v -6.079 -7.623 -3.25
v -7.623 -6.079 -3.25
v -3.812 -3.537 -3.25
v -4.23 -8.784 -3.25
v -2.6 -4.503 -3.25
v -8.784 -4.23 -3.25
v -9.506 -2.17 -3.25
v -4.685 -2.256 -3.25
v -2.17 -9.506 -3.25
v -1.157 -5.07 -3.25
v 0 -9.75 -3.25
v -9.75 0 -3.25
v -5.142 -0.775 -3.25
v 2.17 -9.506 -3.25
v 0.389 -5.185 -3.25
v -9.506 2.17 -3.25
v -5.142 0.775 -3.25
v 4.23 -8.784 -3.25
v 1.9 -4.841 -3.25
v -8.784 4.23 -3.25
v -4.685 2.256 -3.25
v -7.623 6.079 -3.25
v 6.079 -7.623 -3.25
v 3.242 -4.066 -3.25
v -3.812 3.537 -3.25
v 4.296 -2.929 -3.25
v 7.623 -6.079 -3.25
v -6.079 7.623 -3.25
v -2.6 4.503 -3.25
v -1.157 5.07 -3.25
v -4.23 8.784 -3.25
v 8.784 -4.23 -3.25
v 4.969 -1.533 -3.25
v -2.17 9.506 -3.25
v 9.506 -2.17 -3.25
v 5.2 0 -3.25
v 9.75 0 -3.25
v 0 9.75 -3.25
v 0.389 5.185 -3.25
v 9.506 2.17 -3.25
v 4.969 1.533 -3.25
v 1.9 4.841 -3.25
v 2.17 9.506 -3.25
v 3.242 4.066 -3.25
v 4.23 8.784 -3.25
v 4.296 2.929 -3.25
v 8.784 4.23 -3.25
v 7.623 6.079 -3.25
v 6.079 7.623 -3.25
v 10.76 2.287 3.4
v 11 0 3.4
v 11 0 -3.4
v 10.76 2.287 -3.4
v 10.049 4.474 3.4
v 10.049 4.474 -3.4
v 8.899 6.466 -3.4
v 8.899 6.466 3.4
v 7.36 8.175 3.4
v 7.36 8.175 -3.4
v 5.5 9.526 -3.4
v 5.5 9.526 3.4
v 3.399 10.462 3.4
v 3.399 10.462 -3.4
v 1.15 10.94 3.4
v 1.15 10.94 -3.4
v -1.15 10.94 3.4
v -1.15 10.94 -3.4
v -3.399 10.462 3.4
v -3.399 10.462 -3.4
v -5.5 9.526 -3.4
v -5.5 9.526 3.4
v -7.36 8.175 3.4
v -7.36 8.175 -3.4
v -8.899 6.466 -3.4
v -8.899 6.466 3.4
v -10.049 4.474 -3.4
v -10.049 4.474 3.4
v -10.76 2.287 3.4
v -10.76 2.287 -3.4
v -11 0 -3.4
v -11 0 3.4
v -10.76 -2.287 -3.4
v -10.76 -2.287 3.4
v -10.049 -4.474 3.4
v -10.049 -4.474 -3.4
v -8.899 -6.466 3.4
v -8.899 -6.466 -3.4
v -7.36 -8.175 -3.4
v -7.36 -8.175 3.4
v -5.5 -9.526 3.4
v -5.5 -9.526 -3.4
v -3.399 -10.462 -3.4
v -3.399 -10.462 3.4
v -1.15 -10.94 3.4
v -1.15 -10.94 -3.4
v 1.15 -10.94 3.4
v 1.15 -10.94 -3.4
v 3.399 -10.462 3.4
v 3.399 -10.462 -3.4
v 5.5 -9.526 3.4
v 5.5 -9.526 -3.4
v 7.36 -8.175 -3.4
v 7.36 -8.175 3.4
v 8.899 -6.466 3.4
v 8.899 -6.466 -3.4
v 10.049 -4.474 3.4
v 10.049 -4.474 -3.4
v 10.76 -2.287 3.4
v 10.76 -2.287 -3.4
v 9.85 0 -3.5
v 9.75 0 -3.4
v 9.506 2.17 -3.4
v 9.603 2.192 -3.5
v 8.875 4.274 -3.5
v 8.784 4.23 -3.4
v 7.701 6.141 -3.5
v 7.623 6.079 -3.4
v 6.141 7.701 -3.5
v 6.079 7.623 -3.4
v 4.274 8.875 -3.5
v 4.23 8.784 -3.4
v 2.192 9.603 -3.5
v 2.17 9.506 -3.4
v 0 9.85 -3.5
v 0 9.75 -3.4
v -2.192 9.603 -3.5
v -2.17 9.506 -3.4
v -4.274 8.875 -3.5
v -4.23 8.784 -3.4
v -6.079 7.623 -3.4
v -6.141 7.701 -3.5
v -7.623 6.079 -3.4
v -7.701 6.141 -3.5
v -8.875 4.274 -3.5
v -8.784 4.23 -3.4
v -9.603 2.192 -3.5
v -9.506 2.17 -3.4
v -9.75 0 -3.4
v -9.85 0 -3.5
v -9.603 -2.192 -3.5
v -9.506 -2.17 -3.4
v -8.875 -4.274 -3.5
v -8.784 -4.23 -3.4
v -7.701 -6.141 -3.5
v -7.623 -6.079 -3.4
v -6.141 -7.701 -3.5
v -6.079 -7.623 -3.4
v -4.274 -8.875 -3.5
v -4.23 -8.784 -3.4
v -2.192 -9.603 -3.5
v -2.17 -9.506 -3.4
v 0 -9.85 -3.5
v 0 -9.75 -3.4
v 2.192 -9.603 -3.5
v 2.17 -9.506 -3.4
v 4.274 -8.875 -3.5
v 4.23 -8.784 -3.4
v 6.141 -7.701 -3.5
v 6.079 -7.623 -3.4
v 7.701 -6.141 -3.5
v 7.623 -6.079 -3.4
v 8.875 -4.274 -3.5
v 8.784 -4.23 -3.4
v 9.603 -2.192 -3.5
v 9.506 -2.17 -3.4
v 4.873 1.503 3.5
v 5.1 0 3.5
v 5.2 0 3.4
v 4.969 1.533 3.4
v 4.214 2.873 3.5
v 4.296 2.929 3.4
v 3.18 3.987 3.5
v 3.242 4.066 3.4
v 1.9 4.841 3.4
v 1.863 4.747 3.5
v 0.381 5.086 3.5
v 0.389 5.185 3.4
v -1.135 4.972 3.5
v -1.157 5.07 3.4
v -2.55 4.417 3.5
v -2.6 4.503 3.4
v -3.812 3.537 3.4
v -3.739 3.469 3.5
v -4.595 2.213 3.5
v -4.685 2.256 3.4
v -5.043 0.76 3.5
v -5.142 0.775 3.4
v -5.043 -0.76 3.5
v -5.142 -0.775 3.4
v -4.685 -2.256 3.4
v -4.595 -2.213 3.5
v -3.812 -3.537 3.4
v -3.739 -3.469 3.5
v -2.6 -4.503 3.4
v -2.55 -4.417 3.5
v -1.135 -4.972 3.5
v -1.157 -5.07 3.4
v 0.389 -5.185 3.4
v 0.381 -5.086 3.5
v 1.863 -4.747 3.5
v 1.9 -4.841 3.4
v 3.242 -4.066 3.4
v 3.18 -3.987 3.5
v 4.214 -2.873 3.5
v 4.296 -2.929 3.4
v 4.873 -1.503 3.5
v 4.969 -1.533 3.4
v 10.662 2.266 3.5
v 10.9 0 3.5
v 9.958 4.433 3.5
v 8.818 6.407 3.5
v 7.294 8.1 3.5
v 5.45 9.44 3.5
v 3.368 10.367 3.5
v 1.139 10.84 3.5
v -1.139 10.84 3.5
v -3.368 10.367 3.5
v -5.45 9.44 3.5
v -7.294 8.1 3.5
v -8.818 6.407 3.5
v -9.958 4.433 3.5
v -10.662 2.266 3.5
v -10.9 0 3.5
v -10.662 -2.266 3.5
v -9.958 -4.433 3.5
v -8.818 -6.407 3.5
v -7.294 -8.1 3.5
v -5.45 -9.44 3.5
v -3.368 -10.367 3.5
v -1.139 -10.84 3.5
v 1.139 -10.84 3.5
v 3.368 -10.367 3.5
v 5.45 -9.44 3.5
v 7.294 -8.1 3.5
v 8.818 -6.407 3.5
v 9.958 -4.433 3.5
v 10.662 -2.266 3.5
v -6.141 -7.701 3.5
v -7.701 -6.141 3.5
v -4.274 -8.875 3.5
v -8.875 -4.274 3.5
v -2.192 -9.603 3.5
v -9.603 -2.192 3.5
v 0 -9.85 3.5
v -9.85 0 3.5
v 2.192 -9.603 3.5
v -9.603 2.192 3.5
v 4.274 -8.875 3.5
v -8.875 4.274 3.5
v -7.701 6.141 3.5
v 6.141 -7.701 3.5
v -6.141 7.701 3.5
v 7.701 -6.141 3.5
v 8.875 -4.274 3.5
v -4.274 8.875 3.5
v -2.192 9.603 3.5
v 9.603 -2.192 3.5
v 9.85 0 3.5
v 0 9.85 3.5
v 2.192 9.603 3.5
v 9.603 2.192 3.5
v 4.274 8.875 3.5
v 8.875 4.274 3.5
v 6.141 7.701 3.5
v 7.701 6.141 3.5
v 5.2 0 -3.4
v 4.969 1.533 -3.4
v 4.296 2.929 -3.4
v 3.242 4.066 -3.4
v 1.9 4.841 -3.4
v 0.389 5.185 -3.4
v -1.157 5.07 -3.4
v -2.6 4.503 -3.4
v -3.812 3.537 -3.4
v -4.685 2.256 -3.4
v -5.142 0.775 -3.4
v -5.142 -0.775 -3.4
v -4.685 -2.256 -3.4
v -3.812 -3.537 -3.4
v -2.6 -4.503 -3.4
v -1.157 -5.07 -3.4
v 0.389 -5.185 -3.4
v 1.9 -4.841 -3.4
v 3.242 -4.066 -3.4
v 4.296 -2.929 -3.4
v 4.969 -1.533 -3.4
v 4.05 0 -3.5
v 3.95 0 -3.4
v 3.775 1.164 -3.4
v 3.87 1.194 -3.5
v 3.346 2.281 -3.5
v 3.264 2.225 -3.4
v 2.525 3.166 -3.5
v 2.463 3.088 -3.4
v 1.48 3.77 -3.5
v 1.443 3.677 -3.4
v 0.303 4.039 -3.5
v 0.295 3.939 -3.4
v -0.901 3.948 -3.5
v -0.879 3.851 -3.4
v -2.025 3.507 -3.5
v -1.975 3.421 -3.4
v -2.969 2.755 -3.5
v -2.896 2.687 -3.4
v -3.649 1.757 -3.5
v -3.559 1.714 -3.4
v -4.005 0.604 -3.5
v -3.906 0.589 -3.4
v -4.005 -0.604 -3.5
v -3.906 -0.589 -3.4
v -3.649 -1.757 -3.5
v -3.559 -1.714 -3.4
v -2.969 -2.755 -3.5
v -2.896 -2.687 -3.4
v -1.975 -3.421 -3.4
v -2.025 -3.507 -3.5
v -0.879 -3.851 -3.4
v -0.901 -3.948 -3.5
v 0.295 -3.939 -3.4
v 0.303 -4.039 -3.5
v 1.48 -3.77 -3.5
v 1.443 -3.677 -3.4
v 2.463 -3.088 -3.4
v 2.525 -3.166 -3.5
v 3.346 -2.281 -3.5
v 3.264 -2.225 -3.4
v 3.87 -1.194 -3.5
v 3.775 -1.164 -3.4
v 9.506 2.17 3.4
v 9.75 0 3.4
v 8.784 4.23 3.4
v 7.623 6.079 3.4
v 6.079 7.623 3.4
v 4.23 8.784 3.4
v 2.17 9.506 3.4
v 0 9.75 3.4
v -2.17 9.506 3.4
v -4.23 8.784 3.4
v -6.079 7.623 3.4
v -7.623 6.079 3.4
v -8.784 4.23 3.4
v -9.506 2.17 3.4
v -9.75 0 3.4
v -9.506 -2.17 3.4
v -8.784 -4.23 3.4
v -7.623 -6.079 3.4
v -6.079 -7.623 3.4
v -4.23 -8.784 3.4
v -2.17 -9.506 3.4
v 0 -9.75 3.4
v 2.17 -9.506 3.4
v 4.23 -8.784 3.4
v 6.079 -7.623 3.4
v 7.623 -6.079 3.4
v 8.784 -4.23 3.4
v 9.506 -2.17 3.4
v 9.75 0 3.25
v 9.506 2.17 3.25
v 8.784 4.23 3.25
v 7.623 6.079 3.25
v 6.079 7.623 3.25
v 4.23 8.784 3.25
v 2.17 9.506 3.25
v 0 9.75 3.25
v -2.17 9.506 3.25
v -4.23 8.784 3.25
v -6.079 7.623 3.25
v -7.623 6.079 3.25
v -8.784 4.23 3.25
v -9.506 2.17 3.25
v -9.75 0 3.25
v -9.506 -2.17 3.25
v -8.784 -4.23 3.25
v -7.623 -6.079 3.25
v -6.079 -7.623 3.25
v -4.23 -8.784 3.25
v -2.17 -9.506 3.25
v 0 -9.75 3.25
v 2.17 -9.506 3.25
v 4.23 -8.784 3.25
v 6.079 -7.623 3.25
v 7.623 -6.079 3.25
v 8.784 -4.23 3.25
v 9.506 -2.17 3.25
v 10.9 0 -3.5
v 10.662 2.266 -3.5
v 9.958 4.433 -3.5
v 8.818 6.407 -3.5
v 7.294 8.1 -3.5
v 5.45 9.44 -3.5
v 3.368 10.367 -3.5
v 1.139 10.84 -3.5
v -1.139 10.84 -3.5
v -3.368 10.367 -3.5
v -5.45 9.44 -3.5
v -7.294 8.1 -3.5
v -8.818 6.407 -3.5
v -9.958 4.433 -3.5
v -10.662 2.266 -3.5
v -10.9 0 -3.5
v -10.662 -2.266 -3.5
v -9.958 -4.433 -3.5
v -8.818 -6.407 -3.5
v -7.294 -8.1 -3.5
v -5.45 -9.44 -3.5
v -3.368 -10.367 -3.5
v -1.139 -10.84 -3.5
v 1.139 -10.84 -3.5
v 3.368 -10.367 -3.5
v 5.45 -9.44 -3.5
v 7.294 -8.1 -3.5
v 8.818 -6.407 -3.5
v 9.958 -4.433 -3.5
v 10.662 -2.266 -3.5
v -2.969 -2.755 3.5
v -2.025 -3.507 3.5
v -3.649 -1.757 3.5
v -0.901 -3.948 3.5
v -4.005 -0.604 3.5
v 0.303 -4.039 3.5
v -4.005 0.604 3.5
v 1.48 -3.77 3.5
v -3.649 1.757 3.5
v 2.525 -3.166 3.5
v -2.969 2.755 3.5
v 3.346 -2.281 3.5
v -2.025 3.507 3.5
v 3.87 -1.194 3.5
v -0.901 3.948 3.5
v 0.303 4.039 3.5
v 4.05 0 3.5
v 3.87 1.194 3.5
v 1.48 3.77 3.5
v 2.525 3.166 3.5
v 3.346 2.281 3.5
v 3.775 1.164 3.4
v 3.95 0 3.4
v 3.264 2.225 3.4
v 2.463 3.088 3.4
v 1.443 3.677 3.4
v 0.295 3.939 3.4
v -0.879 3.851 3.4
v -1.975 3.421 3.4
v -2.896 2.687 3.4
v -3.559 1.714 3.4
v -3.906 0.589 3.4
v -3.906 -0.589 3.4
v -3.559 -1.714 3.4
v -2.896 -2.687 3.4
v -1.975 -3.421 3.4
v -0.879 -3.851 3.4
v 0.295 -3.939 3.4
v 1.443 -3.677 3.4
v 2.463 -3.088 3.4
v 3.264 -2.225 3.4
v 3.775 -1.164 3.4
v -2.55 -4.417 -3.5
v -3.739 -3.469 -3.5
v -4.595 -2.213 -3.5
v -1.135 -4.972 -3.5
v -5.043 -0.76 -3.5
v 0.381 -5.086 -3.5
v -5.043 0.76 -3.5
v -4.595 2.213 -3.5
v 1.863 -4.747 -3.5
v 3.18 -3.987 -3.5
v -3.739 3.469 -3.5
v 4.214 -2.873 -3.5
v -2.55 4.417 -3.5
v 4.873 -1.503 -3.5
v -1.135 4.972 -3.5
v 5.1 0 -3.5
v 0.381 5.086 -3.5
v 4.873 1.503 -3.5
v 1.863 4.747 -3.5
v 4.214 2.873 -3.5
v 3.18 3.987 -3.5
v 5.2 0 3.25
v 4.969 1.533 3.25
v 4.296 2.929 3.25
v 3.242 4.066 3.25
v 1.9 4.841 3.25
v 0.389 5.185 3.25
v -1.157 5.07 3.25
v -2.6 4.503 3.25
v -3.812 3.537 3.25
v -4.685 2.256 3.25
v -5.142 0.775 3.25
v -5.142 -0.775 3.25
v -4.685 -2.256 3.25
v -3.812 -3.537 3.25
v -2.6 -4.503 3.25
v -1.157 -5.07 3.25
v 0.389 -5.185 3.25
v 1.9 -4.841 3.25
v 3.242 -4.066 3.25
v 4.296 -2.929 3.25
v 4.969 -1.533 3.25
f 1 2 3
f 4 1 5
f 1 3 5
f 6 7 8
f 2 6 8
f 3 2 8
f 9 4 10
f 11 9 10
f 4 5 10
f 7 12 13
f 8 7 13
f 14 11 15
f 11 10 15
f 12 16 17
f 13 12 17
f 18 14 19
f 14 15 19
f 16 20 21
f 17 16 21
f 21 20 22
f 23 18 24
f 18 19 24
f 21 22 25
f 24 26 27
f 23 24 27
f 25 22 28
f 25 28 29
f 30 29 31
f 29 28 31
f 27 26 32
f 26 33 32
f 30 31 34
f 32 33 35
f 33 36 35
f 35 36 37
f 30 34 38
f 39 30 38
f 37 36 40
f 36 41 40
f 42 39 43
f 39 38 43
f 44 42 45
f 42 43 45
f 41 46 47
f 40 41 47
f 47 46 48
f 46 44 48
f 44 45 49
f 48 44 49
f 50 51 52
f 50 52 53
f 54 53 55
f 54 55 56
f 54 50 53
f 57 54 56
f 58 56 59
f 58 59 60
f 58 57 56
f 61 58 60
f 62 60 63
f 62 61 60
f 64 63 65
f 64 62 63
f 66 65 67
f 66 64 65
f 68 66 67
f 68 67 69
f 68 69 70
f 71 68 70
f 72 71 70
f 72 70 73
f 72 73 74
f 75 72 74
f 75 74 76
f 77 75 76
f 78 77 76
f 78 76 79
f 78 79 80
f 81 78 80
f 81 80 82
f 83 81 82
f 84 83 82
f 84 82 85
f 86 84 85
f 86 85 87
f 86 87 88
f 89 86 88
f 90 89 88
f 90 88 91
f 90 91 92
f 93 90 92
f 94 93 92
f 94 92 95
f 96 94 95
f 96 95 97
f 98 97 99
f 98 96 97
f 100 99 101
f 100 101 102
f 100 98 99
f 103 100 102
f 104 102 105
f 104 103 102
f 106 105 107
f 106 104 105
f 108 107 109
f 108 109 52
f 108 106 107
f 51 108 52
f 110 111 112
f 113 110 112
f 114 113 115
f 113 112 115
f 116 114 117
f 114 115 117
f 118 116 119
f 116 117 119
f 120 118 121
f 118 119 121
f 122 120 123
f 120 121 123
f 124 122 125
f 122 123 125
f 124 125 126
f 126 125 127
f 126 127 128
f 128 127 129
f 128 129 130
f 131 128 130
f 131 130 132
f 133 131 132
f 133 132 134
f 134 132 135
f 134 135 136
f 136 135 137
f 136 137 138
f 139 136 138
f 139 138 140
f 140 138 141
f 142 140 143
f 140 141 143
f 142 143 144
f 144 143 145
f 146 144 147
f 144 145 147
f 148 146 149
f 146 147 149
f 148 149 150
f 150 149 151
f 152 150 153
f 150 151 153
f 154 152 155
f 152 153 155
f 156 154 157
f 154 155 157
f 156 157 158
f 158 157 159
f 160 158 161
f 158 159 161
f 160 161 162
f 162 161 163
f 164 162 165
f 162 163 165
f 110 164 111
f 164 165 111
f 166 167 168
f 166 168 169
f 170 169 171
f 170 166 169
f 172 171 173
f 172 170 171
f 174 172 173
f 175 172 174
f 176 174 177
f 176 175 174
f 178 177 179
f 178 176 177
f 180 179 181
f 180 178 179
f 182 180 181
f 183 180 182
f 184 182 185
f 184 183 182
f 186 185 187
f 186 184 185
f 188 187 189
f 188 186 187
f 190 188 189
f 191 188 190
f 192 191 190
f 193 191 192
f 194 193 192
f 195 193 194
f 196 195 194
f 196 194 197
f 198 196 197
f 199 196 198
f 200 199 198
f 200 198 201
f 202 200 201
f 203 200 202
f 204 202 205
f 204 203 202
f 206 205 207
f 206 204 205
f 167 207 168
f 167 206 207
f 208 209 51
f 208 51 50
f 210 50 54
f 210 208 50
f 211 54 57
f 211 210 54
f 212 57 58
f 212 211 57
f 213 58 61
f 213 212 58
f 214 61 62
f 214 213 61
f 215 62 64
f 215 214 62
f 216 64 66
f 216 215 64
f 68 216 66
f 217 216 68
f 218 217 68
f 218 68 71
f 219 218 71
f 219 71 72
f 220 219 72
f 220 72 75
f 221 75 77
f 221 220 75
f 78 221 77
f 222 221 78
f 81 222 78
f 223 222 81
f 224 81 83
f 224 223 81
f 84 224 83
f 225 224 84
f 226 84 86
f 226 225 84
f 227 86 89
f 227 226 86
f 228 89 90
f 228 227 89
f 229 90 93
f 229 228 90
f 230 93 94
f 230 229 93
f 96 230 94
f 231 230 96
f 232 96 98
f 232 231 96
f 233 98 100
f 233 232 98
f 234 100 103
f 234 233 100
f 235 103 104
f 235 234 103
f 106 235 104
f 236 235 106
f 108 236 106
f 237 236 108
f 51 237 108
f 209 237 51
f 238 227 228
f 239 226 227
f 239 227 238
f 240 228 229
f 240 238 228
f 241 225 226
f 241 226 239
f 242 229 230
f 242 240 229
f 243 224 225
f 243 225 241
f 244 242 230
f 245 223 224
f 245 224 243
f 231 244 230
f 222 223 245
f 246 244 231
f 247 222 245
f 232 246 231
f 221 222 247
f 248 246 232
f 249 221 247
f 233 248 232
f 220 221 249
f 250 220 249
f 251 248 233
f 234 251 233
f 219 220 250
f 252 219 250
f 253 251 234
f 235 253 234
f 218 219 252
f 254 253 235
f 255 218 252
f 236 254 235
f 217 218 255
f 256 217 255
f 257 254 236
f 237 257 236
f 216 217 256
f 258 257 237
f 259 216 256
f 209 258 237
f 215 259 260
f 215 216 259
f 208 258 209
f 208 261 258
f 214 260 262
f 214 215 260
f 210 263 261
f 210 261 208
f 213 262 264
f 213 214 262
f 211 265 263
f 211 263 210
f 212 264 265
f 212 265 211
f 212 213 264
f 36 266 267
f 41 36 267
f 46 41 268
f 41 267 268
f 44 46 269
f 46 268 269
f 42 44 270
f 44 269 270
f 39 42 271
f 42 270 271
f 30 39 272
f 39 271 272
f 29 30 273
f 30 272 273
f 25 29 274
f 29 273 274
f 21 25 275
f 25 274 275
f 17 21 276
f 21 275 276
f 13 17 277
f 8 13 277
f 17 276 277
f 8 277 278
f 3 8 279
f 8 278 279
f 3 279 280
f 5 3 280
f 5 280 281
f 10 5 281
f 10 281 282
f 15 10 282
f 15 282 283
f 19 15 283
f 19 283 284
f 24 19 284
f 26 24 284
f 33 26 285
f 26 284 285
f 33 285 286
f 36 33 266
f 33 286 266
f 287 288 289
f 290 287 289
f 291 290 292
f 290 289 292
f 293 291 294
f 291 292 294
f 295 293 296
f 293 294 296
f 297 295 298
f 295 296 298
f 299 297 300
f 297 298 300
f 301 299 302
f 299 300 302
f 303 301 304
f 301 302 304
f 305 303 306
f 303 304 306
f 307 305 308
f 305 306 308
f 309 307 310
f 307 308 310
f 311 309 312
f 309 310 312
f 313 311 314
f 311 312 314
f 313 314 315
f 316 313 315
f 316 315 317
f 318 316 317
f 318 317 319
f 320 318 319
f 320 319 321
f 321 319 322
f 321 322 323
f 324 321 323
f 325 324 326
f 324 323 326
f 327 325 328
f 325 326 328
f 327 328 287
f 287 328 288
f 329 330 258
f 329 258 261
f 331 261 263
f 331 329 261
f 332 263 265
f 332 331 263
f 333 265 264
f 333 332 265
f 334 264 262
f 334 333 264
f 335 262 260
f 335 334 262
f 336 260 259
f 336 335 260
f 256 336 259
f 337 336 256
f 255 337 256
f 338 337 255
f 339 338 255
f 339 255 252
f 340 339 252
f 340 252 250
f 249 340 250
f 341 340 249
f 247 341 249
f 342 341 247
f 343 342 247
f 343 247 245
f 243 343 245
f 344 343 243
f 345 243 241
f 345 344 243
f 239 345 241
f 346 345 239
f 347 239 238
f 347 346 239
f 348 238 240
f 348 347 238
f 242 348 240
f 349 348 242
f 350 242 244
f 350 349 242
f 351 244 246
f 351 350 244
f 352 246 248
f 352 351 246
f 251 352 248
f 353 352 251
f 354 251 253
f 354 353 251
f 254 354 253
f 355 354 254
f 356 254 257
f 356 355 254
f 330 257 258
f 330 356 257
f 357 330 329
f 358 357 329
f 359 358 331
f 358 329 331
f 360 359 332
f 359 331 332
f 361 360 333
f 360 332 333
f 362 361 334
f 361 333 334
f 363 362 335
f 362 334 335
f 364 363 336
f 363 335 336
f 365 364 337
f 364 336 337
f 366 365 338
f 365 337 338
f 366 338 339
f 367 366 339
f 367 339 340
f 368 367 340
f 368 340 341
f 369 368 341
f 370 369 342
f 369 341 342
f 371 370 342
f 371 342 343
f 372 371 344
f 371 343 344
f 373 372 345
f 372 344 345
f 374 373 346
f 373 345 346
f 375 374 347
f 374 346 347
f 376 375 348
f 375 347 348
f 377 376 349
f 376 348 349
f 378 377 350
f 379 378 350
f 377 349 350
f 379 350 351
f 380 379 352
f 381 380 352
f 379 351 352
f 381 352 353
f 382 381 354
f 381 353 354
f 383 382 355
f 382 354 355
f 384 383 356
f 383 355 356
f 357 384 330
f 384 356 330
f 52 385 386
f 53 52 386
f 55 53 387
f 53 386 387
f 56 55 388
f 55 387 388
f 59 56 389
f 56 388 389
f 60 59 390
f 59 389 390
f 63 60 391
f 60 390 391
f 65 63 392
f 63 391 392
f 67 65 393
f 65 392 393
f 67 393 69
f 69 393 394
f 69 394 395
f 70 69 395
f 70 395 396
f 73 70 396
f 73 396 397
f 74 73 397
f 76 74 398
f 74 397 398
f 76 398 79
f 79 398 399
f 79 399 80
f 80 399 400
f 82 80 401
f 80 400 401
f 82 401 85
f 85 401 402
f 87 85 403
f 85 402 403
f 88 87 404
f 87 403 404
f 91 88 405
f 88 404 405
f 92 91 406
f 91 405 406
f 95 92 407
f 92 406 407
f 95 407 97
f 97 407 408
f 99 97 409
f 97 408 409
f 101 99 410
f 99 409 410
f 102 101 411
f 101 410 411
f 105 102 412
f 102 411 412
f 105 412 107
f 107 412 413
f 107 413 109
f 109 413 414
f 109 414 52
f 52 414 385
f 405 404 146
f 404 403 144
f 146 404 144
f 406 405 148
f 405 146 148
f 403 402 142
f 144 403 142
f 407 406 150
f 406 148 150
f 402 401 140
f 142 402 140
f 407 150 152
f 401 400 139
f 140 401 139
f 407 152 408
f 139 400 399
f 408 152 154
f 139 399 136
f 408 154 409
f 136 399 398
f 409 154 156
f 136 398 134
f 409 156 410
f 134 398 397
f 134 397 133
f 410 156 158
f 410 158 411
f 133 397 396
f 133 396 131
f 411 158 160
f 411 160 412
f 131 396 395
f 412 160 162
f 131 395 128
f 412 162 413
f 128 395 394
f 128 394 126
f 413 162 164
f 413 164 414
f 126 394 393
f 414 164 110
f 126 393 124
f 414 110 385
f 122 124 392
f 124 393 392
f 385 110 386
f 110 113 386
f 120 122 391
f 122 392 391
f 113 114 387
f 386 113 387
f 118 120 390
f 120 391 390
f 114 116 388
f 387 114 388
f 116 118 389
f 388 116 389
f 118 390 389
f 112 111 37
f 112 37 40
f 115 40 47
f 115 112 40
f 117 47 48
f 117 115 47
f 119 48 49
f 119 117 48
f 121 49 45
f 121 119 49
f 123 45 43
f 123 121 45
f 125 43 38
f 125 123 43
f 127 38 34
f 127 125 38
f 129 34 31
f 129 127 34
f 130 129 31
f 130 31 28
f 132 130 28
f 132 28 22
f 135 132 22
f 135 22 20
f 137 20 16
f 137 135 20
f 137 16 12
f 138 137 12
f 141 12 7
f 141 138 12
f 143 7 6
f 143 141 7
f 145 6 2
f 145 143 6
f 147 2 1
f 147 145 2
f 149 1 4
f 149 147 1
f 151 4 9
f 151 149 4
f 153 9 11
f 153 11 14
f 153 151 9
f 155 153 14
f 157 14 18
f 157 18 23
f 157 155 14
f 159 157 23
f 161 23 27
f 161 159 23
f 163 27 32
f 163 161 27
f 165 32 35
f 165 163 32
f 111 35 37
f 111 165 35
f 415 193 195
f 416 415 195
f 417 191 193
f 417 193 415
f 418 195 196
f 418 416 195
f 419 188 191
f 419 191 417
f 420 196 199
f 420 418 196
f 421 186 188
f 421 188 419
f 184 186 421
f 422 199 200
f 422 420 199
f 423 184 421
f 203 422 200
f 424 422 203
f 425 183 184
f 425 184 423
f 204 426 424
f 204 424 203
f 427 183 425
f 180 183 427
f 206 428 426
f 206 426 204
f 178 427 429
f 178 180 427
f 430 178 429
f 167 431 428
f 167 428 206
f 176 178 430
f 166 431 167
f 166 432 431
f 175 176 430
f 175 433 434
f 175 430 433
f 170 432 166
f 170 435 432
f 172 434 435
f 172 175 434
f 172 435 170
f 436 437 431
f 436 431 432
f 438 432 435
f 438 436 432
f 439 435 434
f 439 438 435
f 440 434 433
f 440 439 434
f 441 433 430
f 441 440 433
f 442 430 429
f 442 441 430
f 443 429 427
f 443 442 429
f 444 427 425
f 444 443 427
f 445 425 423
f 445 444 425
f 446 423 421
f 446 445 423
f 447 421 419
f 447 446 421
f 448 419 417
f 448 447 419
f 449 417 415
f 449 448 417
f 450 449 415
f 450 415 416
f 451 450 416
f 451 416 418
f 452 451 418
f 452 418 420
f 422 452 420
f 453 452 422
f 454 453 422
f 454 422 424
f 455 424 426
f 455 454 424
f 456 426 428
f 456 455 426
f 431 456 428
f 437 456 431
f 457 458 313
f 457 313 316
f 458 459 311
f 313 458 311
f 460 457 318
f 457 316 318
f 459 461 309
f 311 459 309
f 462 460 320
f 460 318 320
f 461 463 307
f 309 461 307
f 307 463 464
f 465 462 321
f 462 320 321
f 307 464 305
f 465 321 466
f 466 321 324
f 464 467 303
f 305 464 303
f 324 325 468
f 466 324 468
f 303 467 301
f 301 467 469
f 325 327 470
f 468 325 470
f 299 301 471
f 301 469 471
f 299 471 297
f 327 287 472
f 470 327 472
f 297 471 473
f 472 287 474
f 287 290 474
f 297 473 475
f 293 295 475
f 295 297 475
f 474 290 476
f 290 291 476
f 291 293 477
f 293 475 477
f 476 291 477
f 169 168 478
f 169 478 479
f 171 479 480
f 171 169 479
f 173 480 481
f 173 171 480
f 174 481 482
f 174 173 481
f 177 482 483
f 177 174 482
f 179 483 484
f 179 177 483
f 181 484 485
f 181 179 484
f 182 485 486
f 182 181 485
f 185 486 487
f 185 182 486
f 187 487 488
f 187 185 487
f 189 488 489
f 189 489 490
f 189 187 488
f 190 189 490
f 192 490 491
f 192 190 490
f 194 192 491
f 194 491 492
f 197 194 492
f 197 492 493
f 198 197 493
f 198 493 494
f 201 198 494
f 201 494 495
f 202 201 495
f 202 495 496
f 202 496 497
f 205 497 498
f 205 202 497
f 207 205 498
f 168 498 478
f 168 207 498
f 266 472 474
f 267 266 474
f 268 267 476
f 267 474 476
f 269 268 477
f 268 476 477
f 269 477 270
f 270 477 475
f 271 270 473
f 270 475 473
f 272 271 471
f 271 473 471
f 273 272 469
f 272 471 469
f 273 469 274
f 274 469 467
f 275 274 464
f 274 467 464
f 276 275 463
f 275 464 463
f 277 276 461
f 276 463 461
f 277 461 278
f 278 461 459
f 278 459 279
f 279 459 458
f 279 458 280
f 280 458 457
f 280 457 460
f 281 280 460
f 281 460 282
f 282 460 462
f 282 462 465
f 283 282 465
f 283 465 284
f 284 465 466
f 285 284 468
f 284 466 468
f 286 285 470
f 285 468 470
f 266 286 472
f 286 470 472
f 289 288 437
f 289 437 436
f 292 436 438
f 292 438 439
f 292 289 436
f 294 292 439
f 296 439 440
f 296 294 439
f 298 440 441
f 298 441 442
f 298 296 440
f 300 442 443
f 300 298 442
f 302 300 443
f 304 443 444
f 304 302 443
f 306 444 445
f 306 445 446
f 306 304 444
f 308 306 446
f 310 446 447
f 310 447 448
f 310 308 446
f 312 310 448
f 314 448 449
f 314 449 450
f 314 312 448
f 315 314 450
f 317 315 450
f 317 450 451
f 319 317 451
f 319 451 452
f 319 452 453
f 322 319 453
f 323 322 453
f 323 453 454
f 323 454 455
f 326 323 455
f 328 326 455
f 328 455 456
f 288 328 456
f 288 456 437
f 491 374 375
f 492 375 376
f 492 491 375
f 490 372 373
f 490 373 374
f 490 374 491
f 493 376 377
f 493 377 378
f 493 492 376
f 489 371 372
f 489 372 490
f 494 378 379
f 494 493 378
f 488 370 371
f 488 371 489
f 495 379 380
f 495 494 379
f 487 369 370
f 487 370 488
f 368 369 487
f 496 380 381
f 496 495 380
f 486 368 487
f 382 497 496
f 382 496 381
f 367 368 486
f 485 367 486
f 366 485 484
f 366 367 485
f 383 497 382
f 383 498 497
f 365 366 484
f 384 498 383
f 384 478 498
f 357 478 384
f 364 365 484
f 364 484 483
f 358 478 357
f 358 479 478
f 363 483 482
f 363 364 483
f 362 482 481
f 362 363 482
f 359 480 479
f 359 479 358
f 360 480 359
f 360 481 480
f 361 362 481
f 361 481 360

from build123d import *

# Parameters (mm, degrees)
SKETCH1_R                = 11
SKETCH1_R_2              = 3.95
BOSS_EXTRUDE1_DEPTH      = 3.5
BOSS_EXTRUDE1_DEPTH_BACK = 3.5
CUT_EXTRUDE1_START       = -3.5
SKETCH2_R                = 9.75
SKETCH2_R_2              = 5.2
CUT_EXTRUDE1_DEPTH       = 0.25
CUT_EXTRUDE2_START       = 3.5
SKETCH2_2_R              = 9.75
SKETCH2_2_R_2            = 5.2
CUT_EXTRUDE2_DEPTH       = 0.25
CHAMFER1_SIZE            = 0.1


with BuildPart() as part:
    # Sketch1 → Boss-Extrude1 (new body, two sides)
    with BuildSketch(Plane.XY) as boss_extrude1_sk:
        Circle(SKETCH1_R)
        Circle(SKETCH1_R_2, mode=Mode.SUBTRACT)
    extrude(amount=BOSS_EXTRUDE1_DEPTH)
    extrude(boss_extrude1_sk.sketch, amount=-BOSS_EXTRUDE1_DEPTH_BACK)

    # Sketch2 → Cut-Extrude1 (cut)
    with BuildSketch(Plane.XY.offset(CUT_EXTRUDE1_START)):
        Circle(SKETCH2_R)
        Circle(SKETCH2_R_2, mode=Mode.SUBTRACT)
    extrude(amount=CUT_EXTRUDE1_DEPTH, mode=Mode.SUBTRACT)

    # Sketch2<2> → Cut-Extrude2 (cut)
    with BuildSketch(Plane.XY.offset(CUT_EXTRUDE2_START)):
        Circle(SKETCH2_2_R)
        Circle(SKETCH2_2_R_2, mode=Mode.SUBTRACT)
    extrude(amount=-CUT_EXTRUDE2_DEPTH, mode=Mode.SUBTRACT)

    # Chamfer1
    chamfer1_edges = [part.edges().sort_by_distance(p)[0] for p in [
        (-5.2, 0, -3.5),
        (-9.75, 0, -3.5),
        (-9.75, 0, 3.5),
        (-5.2, 0, 3.5),
        (-11, 0, -3.5),
        (-3.95, 0, -3.5),
        (-11, 0, 3.5),
        (-3.95, 0, 3.5),
    ]]
    chamfer(chamfer1_edges, length=CHAMFER1_SIZE)


solid = part.part
